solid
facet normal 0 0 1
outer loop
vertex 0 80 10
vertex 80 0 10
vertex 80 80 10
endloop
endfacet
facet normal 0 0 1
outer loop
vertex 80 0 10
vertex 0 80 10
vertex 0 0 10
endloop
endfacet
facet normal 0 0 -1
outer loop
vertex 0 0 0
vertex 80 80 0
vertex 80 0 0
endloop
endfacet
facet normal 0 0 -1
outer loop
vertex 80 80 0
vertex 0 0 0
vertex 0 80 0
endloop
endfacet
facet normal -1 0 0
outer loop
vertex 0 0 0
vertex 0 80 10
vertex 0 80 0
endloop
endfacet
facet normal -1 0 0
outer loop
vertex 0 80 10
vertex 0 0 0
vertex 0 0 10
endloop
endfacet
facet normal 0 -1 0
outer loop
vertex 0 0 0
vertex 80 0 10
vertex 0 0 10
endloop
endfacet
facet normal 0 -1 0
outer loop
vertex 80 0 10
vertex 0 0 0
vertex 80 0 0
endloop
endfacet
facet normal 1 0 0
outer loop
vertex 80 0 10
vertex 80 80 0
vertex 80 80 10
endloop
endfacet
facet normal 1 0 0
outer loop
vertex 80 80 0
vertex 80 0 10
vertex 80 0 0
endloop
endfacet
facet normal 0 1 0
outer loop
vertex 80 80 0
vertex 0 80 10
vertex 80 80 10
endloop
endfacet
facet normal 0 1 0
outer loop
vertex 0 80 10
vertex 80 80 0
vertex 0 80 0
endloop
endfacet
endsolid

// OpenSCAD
module checkerboard(x_max, y_max, flip) {
    for (i = [0:1:y_max]) {
        for (x = [0:1:x_max]) {
            translate([10 * x, 10 * i, 0]) {
                if ((x + i) % 2 == 0) {
                    color(flip ? "black" : "white") cube(10);
                } else {
                    color(flip ? "white" : "black") cube(10);
                }
            }
        }
    }
}

// Call the function with initial state
checkerboard(7, 7, true);
